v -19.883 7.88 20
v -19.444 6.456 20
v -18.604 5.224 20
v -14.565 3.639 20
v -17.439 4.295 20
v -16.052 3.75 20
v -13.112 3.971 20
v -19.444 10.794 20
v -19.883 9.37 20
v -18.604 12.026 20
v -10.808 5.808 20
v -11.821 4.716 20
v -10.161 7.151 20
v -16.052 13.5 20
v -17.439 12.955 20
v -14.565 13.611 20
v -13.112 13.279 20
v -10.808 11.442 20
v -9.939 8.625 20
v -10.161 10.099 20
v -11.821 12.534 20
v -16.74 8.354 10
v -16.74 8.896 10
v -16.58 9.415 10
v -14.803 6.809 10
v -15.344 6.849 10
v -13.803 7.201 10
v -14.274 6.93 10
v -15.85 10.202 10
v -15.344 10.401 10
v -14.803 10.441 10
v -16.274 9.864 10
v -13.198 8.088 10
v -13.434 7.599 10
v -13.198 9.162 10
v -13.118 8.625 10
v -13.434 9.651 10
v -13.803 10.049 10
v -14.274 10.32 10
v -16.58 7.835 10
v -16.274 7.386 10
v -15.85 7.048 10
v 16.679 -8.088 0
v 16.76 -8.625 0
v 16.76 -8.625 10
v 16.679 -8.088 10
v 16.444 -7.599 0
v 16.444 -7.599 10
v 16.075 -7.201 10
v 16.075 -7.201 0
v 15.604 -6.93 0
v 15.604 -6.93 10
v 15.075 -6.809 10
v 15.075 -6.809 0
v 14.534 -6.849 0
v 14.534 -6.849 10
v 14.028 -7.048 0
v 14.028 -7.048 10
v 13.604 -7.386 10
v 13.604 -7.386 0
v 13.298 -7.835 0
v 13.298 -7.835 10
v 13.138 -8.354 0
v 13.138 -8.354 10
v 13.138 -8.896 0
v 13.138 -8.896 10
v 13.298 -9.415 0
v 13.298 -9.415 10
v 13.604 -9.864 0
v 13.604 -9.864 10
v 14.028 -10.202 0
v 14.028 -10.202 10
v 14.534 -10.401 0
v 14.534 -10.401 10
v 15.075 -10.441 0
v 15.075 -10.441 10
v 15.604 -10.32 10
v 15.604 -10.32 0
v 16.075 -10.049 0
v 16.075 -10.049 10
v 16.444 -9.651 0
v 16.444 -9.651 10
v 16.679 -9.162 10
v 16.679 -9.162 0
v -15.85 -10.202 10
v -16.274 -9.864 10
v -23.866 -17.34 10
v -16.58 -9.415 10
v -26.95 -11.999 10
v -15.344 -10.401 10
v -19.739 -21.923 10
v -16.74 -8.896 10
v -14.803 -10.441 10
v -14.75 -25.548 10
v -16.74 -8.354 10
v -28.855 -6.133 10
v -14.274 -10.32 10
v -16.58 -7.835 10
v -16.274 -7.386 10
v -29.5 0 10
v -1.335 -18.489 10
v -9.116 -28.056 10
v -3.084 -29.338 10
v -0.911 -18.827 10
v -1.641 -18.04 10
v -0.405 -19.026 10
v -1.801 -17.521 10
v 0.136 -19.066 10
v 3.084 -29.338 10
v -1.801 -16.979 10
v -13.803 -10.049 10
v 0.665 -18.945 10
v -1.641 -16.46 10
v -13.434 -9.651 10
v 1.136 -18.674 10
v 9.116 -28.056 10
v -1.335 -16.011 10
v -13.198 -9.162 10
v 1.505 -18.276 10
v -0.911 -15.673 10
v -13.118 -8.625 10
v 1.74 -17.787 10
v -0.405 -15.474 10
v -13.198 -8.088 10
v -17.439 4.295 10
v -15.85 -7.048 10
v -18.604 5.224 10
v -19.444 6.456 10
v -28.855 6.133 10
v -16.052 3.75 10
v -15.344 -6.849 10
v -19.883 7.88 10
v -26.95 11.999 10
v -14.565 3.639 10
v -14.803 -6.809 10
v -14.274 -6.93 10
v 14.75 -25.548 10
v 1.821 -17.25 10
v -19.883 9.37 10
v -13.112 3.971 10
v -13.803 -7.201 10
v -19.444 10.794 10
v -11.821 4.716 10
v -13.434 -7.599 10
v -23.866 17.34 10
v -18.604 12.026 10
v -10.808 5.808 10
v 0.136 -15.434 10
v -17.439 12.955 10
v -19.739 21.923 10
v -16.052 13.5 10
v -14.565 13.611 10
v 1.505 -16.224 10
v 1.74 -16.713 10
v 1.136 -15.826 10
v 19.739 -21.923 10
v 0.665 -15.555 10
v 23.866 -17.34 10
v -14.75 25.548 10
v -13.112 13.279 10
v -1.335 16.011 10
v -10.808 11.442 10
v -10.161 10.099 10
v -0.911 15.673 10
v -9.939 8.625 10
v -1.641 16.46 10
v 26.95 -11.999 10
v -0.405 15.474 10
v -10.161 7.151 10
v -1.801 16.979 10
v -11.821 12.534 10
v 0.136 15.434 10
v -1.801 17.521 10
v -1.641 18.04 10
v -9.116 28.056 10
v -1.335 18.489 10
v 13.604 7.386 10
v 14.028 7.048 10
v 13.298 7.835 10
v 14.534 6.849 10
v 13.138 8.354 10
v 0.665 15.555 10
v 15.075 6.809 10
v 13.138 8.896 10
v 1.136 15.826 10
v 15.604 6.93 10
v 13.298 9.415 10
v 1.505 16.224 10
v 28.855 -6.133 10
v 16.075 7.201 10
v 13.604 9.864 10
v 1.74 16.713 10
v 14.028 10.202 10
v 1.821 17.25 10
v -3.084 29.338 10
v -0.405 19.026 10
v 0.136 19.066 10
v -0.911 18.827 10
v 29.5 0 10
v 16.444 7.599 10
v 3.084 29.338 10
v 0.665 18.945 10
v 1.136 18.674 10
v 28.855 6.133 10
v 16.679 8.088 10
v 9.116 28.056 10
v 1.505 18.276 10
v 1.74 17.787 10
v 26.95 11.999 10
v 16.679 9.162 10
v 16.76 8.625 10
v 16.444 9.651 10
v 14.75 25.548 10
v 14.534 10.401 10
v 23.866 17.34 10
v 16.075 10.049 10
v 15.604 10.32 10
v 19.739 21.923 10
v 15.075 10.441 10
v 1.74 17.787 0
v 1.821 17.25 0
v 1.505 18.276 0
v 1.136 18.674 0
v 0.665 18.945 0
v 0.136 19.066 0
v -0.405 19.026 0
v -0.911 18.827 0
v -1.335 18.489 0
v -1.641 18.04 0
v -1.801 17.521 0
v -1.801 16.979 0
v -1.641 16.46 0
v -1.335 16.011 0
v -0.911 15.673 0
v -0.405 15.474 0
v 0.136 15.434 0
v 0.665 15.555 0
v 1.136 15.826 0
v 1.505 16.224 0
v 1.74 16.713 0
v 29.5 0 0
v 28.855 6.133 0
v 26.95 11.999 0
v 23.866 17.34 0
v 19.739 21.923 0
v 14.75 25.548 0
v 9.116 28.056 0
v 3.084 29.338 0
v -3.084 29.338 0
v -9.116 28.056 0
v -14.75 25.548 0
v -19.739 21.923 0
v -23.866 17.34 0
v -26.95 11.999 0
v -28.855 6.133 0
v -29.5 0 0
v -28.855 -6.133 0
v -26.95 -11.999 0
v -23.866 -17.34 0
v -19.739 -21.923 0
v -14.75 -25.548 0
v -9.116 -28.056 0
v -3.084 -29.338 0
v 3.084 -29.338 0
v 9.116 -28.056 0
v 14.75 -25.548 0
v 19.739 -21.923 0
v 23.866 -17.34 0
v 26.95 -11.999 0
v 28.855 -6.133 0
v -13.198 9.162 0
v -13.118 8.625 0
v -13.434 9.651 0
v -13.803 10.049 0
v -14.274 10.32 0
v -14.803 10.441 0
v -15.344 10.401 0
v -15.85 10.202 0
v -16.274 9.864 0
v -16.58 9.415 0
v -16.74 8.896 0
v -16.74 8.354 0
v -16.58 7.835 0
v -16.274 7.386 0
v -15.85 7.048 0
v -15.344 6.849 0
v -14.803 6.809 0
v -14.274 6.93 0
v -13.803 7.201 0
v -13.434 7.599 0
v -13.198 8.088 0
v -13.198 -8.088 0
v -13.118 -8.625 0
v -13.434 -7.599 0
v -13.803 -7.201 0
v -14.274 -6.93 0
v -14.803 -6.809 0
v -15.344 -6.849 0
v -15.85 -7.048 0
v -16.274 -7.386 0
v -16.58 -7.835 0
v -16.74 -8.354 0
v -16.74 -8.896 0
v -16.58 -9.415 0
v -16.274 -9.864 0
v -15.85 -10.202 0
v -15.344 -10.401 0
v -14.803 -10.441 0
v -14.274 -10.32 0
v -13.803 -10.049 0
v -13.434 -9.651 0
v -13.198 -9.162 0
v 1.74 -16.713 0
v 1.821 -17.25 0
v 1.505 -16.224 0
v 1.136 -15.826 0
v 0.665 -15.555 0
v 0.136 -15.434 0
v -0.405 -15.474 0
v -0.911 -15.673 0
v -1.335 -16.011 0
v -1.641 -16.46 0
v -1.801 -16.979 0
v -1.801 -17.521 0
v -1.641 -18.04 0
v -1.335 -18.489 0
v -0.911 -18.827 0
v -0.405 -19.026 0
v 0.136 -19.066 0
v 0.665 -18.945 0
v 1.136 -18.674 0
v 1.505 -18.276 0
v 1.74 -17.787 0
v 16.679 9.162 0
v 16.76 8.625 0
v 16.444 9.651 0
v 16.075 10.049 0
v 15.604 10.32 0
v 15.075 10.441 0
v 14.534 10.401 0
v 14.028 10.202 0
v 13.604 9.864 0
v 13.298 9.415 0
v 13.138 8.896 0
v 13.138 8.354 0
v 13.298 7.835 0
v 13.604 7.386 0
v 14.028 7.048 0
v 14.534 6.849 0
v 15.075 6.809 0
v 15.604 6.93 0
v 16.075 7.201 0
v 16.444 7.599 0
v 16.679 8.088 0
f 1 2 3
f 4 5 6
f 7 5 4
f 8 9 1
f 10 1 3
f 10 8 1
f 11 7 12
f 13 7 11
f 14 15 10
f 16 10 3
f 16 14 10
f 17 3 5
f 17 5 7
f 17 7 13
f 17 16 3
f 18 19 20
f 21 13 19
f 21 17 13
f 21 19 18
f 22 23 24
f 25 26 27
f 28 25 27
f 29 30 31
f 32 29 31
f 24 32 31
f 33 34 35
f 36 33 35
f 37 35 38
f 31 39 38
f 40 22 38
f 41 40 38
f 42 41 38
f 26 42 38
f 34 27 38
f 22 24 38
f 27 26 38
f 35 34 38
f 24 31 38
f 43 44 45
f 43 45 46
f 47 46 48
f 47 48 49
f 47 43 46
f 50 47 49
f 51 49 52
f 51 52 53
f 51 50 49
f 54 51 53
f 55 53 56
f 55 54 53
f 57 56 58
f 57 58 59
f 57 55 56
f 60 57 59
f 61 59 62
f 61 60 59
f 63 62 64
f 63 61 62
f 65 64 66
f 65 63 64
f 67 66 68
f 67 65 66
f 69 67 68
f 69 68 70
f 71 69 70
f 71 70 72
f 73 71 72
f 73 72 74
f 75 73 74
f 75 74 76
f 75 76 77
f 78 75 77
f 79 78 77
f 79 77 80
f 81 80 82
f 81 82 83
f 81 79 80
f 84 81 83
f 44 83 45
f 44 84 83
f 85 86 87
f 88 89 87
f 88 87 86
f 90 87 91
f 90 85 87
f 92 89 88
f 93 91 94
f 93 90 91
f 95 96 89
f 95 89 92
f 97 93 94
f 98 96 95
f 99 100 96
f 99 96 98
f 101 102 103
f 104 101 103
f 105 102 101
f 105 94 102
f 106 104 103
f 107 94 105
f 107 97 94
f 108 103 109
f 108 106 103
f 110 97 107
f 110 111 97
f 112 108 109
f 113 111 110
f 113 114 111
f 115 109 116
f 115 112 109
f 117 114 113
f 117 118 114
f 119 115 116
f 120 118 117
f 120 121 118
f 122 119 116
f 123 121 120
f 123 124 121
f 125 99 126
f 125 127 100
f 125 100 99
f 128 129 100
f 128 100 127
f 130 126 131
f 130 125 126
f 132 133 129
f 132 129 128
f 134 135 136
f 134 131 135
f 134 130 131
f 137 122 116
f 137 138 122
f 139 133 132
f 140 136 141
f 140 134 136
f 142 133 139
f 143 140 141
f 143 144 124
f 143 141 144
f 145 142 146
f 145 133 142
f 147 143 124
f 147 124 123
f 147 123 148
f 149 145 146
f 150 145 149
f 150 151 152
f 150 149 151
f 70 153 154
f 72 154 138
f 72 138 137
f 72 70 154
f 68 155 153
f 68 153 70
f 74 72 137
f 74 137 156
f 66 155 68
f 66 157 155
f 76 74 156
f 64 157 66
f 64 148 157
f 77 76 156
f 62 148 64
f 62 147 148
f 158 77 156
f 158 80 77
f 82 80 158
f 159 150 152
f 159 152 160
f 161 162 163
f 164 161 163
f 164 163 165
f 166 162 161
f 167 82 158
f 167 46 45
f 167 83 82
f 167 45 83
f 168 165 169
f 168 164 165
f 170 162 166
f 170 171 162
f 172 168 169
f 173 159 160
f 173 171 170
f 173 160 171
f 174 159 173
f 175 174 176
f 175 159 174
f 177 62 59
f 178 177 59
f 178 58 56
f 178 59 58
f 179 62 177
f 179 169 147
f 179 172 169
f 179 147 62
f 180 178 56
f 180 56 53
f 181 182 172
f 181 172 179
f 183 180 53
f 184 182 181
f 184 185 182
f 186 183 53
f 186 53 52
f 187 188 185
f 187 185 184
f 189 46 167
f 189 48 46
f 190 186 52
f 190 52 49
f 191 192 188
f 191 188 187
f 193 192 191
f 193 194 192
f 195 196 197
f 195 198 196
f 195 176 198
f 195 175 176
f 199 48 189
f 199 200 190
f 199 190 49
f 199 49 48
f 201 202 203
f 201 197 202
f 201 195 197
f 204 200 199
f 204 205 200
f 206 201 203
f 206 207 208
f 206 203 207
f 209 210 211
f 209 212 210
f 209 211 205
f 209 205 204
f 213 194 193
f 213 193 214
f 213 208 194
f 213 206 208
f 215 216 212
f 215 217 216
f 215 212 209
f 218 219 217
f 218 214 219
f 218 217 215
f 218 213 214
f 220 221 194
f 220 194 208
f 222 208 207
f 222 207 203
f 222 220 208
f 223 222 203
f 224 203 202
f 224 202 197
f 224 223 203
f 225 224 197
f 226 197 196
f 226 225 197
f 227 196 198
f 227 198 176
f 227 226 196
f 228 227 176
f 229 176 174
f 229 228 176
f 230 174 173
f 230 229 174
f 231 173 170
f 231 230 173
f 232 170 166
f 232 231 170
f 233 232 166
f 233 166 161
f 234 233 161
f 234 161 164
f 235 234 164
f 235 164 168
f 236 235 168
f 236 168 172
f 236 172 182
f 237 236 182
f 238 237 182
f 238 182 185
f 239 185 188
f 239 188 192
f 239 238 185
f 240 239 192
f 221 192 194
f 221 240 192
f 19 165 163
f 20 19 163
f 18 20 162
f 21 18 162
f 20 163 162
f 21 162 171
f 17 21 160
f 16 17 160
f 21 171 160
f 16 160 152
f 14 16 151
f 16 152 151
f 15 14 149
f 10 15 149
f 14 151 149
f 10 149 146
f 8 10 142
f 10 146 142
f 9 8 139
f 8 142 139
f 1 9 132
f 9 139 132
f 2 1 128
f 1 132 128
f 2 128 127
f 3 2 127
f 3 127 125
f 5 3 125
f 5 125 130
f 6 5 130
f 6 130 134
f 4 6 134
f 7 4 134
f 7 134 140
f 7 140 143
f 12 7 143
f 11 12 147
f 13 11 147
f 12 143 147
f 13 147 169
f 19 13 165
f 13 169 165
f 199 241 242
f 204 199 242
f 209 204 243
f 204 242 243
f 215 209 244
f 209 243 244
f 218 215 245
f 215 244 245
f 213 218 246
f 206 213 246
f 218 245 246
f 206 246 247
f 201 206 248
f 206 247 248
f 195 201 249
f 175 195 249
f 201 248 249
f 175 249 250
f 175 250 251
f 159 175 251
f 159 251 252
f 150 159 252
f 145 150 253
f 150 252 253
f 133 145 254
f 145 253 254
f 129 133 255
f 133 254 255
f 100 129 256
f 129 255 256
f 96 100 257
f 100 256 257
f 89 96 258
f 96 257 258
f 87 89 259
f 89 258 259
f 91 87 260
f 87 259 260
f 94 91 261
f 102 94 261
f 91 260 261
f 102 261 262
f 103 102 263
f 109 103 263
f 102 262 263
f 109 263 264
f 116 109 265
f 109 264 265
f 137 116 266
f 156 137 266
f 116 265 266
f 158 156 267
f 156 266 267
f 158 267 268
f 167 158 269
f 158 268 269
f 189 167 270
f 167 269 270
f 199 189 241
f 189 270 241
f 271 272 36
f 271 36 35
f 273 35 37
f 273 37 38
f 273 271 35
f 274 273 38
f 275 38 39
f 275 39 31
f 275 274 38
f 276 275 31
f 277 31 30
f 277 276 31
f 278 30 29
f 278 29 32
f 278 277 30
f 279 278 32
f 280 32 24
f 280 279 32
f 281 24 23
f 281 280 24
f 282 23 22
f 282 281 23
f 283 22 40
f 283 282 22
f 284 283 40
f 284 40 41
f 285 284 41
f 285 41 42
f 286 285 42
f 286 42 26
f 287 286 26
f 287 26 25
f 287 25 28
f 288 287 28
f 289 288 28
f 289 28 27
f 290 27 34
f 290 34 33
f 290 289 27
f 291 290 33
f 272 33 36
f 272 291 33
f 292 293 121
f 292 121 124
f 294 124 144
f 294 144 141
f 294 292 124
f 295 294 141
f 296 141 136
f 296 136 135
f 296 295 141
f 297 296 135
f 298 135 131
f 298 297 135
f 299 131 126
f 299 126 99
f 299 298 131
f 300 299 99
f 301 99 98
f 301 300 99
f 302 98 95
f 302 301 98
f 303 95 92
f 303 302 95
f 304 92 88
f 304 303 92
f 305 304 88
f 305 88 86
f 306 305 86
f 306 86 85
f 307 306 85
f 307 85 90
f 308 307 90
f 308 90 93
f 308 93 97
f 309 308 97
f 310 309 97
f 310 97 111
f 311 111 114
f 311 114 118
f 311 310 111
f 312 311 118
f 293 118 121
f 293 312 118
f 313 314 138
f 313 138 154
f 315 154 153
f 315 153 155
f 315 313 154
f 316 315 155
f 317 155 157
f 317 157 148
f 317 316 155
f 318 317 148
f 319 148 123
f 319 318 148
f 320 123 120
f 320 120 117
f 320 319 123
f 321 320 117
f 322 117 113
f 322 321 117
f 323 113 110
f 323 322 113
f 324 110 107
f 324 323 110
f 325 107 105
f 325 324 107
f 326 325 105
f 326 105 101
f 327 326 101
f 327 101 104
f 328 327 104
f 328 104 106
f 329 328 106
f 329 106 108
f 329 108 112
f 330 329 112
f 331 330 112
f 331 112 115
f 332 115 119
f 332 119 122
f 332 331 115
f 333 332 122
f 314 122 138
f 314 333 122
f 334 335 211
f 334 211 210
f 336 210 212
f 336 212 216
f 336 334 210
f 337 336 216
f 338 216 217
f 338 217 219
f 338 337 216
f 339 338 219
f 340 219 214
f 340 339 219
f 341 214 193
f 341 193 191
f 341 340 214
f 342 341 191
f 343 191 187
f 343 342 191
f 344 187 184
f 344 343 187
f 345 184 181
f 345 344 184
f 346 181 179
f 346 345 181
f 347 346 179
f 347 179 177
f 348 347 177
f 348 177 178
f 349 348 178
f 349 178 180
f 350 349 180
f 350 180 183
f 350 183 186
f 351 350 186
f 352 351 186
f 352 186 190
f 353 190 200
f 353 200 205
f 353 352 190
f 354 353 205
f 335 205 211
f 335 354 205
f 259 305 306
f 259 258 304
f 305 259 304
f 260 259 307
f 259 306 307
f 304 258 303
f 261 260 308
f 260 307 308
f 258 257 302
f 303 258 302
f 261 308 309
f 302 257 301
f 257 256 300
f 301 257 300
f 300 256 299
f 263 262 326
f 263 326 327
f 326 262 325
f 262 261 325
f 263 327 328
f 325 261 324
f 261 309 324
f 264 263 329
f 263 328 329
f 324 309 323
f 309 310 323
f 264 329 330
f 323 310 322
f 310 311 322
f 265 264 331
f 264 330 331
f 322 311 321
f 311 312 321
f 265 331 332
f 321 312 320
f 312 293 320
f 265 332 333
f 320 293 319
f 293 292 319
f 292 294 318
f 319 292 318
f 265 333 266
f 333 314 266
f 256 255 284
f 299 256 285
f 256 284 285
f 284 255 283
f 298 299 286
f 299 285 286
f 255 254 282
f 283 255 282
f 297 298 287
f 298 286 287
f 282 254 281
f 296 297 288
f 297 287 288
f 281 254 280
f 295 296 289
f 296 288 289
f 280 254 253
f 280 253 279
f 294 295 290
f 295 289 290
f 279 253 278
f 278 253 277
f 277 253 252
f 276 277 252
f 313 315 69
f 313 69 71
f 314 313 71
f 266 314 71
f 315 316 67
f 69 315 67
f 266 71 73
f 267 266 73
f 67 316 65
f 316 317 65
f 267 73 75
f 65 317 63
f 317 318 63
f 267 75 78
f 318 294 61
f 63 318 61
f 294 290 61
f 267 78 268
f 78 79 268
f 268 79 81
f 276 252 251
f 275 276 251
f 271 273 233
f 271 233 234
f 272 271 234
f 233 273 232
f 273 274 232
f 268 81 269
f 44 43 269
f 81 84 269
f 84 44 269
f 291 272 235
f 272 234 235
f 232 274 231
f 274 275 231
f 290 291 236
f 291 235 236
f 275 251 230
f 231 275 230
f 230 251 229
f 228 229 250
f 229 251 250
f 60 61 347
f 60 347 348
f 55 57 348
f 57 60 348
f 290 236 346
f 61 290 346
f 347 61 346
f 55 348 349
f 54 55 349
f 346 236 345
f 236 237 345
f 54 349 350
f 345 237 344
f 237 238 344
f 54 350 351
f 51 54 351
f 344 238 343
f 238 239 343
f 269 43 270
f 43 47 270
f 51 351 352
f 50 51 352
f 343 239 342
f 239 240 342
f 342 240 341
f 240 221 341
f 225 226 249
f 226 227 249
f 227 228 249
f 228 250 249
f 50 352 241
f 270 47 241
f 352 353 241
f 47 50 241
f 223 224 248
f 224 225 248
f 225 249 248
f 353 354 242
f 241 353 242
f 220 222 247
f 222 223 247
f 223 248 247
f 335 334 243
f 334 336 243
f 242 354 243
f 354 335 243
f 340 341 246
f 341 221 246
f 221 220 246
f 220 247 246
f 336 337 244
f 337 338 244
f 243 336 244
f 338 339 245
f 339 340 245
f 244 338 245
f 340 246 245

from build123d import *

# Parameters (mm, degrees)
SKETCH_1_R      = 29.5
SKETCH_1_R_2    = 1.82136949
EXTRUDE_1_DEPTH = 10
SKETCH_2_R      = 5
EXTRUDE_2_DEPTH = 10


with BuildPart() as part:
    # 草图1 → 凸台-拉伸1 (new body)
    with BuildSketch(Plane.XY):
        Circle(SKETCH_1_R)
        with Locations((0, 17.25)):
            Circle(SKETCH_1_R_2, mode=Mode.SUBTRACT)
        with Locations((14.938938215, 8.625)):
            Circle(SKETCH_1_R_2, mode=Mode.SUBTRACT)
        with Locations((14.938938215, -8.625)):
            Circle(SKETCH_1_R_2, mode=Mode.SUBTRACT)
        with Locations((0, -17.25)):
            Circle(SKETCH_1_R_2, mode=Mode.SUBTRACT)
        with Locations((-14.938938215, -8.625)):
            Circle(SKETCH_1_R_2, mode=Mode.SUBTRACT)
        with Locations((-14.938938215, 8.625)):
            Circle(SKETCH_1_R_2, mode=Mode.SUBTRACT)
    extrude(amount=EXTRUDE_1_DEPTH)

    # 草图2 → 凸台-拉伸2 (add)
    with BuildSketch(Plane.XY.offset(10)):
        with Locations((-14.938938215, 8.625)):
            Circle(SKETCH_2_R)
    extrude(amount=EXTRUDE_2_DEPTH)


solid = part.part
